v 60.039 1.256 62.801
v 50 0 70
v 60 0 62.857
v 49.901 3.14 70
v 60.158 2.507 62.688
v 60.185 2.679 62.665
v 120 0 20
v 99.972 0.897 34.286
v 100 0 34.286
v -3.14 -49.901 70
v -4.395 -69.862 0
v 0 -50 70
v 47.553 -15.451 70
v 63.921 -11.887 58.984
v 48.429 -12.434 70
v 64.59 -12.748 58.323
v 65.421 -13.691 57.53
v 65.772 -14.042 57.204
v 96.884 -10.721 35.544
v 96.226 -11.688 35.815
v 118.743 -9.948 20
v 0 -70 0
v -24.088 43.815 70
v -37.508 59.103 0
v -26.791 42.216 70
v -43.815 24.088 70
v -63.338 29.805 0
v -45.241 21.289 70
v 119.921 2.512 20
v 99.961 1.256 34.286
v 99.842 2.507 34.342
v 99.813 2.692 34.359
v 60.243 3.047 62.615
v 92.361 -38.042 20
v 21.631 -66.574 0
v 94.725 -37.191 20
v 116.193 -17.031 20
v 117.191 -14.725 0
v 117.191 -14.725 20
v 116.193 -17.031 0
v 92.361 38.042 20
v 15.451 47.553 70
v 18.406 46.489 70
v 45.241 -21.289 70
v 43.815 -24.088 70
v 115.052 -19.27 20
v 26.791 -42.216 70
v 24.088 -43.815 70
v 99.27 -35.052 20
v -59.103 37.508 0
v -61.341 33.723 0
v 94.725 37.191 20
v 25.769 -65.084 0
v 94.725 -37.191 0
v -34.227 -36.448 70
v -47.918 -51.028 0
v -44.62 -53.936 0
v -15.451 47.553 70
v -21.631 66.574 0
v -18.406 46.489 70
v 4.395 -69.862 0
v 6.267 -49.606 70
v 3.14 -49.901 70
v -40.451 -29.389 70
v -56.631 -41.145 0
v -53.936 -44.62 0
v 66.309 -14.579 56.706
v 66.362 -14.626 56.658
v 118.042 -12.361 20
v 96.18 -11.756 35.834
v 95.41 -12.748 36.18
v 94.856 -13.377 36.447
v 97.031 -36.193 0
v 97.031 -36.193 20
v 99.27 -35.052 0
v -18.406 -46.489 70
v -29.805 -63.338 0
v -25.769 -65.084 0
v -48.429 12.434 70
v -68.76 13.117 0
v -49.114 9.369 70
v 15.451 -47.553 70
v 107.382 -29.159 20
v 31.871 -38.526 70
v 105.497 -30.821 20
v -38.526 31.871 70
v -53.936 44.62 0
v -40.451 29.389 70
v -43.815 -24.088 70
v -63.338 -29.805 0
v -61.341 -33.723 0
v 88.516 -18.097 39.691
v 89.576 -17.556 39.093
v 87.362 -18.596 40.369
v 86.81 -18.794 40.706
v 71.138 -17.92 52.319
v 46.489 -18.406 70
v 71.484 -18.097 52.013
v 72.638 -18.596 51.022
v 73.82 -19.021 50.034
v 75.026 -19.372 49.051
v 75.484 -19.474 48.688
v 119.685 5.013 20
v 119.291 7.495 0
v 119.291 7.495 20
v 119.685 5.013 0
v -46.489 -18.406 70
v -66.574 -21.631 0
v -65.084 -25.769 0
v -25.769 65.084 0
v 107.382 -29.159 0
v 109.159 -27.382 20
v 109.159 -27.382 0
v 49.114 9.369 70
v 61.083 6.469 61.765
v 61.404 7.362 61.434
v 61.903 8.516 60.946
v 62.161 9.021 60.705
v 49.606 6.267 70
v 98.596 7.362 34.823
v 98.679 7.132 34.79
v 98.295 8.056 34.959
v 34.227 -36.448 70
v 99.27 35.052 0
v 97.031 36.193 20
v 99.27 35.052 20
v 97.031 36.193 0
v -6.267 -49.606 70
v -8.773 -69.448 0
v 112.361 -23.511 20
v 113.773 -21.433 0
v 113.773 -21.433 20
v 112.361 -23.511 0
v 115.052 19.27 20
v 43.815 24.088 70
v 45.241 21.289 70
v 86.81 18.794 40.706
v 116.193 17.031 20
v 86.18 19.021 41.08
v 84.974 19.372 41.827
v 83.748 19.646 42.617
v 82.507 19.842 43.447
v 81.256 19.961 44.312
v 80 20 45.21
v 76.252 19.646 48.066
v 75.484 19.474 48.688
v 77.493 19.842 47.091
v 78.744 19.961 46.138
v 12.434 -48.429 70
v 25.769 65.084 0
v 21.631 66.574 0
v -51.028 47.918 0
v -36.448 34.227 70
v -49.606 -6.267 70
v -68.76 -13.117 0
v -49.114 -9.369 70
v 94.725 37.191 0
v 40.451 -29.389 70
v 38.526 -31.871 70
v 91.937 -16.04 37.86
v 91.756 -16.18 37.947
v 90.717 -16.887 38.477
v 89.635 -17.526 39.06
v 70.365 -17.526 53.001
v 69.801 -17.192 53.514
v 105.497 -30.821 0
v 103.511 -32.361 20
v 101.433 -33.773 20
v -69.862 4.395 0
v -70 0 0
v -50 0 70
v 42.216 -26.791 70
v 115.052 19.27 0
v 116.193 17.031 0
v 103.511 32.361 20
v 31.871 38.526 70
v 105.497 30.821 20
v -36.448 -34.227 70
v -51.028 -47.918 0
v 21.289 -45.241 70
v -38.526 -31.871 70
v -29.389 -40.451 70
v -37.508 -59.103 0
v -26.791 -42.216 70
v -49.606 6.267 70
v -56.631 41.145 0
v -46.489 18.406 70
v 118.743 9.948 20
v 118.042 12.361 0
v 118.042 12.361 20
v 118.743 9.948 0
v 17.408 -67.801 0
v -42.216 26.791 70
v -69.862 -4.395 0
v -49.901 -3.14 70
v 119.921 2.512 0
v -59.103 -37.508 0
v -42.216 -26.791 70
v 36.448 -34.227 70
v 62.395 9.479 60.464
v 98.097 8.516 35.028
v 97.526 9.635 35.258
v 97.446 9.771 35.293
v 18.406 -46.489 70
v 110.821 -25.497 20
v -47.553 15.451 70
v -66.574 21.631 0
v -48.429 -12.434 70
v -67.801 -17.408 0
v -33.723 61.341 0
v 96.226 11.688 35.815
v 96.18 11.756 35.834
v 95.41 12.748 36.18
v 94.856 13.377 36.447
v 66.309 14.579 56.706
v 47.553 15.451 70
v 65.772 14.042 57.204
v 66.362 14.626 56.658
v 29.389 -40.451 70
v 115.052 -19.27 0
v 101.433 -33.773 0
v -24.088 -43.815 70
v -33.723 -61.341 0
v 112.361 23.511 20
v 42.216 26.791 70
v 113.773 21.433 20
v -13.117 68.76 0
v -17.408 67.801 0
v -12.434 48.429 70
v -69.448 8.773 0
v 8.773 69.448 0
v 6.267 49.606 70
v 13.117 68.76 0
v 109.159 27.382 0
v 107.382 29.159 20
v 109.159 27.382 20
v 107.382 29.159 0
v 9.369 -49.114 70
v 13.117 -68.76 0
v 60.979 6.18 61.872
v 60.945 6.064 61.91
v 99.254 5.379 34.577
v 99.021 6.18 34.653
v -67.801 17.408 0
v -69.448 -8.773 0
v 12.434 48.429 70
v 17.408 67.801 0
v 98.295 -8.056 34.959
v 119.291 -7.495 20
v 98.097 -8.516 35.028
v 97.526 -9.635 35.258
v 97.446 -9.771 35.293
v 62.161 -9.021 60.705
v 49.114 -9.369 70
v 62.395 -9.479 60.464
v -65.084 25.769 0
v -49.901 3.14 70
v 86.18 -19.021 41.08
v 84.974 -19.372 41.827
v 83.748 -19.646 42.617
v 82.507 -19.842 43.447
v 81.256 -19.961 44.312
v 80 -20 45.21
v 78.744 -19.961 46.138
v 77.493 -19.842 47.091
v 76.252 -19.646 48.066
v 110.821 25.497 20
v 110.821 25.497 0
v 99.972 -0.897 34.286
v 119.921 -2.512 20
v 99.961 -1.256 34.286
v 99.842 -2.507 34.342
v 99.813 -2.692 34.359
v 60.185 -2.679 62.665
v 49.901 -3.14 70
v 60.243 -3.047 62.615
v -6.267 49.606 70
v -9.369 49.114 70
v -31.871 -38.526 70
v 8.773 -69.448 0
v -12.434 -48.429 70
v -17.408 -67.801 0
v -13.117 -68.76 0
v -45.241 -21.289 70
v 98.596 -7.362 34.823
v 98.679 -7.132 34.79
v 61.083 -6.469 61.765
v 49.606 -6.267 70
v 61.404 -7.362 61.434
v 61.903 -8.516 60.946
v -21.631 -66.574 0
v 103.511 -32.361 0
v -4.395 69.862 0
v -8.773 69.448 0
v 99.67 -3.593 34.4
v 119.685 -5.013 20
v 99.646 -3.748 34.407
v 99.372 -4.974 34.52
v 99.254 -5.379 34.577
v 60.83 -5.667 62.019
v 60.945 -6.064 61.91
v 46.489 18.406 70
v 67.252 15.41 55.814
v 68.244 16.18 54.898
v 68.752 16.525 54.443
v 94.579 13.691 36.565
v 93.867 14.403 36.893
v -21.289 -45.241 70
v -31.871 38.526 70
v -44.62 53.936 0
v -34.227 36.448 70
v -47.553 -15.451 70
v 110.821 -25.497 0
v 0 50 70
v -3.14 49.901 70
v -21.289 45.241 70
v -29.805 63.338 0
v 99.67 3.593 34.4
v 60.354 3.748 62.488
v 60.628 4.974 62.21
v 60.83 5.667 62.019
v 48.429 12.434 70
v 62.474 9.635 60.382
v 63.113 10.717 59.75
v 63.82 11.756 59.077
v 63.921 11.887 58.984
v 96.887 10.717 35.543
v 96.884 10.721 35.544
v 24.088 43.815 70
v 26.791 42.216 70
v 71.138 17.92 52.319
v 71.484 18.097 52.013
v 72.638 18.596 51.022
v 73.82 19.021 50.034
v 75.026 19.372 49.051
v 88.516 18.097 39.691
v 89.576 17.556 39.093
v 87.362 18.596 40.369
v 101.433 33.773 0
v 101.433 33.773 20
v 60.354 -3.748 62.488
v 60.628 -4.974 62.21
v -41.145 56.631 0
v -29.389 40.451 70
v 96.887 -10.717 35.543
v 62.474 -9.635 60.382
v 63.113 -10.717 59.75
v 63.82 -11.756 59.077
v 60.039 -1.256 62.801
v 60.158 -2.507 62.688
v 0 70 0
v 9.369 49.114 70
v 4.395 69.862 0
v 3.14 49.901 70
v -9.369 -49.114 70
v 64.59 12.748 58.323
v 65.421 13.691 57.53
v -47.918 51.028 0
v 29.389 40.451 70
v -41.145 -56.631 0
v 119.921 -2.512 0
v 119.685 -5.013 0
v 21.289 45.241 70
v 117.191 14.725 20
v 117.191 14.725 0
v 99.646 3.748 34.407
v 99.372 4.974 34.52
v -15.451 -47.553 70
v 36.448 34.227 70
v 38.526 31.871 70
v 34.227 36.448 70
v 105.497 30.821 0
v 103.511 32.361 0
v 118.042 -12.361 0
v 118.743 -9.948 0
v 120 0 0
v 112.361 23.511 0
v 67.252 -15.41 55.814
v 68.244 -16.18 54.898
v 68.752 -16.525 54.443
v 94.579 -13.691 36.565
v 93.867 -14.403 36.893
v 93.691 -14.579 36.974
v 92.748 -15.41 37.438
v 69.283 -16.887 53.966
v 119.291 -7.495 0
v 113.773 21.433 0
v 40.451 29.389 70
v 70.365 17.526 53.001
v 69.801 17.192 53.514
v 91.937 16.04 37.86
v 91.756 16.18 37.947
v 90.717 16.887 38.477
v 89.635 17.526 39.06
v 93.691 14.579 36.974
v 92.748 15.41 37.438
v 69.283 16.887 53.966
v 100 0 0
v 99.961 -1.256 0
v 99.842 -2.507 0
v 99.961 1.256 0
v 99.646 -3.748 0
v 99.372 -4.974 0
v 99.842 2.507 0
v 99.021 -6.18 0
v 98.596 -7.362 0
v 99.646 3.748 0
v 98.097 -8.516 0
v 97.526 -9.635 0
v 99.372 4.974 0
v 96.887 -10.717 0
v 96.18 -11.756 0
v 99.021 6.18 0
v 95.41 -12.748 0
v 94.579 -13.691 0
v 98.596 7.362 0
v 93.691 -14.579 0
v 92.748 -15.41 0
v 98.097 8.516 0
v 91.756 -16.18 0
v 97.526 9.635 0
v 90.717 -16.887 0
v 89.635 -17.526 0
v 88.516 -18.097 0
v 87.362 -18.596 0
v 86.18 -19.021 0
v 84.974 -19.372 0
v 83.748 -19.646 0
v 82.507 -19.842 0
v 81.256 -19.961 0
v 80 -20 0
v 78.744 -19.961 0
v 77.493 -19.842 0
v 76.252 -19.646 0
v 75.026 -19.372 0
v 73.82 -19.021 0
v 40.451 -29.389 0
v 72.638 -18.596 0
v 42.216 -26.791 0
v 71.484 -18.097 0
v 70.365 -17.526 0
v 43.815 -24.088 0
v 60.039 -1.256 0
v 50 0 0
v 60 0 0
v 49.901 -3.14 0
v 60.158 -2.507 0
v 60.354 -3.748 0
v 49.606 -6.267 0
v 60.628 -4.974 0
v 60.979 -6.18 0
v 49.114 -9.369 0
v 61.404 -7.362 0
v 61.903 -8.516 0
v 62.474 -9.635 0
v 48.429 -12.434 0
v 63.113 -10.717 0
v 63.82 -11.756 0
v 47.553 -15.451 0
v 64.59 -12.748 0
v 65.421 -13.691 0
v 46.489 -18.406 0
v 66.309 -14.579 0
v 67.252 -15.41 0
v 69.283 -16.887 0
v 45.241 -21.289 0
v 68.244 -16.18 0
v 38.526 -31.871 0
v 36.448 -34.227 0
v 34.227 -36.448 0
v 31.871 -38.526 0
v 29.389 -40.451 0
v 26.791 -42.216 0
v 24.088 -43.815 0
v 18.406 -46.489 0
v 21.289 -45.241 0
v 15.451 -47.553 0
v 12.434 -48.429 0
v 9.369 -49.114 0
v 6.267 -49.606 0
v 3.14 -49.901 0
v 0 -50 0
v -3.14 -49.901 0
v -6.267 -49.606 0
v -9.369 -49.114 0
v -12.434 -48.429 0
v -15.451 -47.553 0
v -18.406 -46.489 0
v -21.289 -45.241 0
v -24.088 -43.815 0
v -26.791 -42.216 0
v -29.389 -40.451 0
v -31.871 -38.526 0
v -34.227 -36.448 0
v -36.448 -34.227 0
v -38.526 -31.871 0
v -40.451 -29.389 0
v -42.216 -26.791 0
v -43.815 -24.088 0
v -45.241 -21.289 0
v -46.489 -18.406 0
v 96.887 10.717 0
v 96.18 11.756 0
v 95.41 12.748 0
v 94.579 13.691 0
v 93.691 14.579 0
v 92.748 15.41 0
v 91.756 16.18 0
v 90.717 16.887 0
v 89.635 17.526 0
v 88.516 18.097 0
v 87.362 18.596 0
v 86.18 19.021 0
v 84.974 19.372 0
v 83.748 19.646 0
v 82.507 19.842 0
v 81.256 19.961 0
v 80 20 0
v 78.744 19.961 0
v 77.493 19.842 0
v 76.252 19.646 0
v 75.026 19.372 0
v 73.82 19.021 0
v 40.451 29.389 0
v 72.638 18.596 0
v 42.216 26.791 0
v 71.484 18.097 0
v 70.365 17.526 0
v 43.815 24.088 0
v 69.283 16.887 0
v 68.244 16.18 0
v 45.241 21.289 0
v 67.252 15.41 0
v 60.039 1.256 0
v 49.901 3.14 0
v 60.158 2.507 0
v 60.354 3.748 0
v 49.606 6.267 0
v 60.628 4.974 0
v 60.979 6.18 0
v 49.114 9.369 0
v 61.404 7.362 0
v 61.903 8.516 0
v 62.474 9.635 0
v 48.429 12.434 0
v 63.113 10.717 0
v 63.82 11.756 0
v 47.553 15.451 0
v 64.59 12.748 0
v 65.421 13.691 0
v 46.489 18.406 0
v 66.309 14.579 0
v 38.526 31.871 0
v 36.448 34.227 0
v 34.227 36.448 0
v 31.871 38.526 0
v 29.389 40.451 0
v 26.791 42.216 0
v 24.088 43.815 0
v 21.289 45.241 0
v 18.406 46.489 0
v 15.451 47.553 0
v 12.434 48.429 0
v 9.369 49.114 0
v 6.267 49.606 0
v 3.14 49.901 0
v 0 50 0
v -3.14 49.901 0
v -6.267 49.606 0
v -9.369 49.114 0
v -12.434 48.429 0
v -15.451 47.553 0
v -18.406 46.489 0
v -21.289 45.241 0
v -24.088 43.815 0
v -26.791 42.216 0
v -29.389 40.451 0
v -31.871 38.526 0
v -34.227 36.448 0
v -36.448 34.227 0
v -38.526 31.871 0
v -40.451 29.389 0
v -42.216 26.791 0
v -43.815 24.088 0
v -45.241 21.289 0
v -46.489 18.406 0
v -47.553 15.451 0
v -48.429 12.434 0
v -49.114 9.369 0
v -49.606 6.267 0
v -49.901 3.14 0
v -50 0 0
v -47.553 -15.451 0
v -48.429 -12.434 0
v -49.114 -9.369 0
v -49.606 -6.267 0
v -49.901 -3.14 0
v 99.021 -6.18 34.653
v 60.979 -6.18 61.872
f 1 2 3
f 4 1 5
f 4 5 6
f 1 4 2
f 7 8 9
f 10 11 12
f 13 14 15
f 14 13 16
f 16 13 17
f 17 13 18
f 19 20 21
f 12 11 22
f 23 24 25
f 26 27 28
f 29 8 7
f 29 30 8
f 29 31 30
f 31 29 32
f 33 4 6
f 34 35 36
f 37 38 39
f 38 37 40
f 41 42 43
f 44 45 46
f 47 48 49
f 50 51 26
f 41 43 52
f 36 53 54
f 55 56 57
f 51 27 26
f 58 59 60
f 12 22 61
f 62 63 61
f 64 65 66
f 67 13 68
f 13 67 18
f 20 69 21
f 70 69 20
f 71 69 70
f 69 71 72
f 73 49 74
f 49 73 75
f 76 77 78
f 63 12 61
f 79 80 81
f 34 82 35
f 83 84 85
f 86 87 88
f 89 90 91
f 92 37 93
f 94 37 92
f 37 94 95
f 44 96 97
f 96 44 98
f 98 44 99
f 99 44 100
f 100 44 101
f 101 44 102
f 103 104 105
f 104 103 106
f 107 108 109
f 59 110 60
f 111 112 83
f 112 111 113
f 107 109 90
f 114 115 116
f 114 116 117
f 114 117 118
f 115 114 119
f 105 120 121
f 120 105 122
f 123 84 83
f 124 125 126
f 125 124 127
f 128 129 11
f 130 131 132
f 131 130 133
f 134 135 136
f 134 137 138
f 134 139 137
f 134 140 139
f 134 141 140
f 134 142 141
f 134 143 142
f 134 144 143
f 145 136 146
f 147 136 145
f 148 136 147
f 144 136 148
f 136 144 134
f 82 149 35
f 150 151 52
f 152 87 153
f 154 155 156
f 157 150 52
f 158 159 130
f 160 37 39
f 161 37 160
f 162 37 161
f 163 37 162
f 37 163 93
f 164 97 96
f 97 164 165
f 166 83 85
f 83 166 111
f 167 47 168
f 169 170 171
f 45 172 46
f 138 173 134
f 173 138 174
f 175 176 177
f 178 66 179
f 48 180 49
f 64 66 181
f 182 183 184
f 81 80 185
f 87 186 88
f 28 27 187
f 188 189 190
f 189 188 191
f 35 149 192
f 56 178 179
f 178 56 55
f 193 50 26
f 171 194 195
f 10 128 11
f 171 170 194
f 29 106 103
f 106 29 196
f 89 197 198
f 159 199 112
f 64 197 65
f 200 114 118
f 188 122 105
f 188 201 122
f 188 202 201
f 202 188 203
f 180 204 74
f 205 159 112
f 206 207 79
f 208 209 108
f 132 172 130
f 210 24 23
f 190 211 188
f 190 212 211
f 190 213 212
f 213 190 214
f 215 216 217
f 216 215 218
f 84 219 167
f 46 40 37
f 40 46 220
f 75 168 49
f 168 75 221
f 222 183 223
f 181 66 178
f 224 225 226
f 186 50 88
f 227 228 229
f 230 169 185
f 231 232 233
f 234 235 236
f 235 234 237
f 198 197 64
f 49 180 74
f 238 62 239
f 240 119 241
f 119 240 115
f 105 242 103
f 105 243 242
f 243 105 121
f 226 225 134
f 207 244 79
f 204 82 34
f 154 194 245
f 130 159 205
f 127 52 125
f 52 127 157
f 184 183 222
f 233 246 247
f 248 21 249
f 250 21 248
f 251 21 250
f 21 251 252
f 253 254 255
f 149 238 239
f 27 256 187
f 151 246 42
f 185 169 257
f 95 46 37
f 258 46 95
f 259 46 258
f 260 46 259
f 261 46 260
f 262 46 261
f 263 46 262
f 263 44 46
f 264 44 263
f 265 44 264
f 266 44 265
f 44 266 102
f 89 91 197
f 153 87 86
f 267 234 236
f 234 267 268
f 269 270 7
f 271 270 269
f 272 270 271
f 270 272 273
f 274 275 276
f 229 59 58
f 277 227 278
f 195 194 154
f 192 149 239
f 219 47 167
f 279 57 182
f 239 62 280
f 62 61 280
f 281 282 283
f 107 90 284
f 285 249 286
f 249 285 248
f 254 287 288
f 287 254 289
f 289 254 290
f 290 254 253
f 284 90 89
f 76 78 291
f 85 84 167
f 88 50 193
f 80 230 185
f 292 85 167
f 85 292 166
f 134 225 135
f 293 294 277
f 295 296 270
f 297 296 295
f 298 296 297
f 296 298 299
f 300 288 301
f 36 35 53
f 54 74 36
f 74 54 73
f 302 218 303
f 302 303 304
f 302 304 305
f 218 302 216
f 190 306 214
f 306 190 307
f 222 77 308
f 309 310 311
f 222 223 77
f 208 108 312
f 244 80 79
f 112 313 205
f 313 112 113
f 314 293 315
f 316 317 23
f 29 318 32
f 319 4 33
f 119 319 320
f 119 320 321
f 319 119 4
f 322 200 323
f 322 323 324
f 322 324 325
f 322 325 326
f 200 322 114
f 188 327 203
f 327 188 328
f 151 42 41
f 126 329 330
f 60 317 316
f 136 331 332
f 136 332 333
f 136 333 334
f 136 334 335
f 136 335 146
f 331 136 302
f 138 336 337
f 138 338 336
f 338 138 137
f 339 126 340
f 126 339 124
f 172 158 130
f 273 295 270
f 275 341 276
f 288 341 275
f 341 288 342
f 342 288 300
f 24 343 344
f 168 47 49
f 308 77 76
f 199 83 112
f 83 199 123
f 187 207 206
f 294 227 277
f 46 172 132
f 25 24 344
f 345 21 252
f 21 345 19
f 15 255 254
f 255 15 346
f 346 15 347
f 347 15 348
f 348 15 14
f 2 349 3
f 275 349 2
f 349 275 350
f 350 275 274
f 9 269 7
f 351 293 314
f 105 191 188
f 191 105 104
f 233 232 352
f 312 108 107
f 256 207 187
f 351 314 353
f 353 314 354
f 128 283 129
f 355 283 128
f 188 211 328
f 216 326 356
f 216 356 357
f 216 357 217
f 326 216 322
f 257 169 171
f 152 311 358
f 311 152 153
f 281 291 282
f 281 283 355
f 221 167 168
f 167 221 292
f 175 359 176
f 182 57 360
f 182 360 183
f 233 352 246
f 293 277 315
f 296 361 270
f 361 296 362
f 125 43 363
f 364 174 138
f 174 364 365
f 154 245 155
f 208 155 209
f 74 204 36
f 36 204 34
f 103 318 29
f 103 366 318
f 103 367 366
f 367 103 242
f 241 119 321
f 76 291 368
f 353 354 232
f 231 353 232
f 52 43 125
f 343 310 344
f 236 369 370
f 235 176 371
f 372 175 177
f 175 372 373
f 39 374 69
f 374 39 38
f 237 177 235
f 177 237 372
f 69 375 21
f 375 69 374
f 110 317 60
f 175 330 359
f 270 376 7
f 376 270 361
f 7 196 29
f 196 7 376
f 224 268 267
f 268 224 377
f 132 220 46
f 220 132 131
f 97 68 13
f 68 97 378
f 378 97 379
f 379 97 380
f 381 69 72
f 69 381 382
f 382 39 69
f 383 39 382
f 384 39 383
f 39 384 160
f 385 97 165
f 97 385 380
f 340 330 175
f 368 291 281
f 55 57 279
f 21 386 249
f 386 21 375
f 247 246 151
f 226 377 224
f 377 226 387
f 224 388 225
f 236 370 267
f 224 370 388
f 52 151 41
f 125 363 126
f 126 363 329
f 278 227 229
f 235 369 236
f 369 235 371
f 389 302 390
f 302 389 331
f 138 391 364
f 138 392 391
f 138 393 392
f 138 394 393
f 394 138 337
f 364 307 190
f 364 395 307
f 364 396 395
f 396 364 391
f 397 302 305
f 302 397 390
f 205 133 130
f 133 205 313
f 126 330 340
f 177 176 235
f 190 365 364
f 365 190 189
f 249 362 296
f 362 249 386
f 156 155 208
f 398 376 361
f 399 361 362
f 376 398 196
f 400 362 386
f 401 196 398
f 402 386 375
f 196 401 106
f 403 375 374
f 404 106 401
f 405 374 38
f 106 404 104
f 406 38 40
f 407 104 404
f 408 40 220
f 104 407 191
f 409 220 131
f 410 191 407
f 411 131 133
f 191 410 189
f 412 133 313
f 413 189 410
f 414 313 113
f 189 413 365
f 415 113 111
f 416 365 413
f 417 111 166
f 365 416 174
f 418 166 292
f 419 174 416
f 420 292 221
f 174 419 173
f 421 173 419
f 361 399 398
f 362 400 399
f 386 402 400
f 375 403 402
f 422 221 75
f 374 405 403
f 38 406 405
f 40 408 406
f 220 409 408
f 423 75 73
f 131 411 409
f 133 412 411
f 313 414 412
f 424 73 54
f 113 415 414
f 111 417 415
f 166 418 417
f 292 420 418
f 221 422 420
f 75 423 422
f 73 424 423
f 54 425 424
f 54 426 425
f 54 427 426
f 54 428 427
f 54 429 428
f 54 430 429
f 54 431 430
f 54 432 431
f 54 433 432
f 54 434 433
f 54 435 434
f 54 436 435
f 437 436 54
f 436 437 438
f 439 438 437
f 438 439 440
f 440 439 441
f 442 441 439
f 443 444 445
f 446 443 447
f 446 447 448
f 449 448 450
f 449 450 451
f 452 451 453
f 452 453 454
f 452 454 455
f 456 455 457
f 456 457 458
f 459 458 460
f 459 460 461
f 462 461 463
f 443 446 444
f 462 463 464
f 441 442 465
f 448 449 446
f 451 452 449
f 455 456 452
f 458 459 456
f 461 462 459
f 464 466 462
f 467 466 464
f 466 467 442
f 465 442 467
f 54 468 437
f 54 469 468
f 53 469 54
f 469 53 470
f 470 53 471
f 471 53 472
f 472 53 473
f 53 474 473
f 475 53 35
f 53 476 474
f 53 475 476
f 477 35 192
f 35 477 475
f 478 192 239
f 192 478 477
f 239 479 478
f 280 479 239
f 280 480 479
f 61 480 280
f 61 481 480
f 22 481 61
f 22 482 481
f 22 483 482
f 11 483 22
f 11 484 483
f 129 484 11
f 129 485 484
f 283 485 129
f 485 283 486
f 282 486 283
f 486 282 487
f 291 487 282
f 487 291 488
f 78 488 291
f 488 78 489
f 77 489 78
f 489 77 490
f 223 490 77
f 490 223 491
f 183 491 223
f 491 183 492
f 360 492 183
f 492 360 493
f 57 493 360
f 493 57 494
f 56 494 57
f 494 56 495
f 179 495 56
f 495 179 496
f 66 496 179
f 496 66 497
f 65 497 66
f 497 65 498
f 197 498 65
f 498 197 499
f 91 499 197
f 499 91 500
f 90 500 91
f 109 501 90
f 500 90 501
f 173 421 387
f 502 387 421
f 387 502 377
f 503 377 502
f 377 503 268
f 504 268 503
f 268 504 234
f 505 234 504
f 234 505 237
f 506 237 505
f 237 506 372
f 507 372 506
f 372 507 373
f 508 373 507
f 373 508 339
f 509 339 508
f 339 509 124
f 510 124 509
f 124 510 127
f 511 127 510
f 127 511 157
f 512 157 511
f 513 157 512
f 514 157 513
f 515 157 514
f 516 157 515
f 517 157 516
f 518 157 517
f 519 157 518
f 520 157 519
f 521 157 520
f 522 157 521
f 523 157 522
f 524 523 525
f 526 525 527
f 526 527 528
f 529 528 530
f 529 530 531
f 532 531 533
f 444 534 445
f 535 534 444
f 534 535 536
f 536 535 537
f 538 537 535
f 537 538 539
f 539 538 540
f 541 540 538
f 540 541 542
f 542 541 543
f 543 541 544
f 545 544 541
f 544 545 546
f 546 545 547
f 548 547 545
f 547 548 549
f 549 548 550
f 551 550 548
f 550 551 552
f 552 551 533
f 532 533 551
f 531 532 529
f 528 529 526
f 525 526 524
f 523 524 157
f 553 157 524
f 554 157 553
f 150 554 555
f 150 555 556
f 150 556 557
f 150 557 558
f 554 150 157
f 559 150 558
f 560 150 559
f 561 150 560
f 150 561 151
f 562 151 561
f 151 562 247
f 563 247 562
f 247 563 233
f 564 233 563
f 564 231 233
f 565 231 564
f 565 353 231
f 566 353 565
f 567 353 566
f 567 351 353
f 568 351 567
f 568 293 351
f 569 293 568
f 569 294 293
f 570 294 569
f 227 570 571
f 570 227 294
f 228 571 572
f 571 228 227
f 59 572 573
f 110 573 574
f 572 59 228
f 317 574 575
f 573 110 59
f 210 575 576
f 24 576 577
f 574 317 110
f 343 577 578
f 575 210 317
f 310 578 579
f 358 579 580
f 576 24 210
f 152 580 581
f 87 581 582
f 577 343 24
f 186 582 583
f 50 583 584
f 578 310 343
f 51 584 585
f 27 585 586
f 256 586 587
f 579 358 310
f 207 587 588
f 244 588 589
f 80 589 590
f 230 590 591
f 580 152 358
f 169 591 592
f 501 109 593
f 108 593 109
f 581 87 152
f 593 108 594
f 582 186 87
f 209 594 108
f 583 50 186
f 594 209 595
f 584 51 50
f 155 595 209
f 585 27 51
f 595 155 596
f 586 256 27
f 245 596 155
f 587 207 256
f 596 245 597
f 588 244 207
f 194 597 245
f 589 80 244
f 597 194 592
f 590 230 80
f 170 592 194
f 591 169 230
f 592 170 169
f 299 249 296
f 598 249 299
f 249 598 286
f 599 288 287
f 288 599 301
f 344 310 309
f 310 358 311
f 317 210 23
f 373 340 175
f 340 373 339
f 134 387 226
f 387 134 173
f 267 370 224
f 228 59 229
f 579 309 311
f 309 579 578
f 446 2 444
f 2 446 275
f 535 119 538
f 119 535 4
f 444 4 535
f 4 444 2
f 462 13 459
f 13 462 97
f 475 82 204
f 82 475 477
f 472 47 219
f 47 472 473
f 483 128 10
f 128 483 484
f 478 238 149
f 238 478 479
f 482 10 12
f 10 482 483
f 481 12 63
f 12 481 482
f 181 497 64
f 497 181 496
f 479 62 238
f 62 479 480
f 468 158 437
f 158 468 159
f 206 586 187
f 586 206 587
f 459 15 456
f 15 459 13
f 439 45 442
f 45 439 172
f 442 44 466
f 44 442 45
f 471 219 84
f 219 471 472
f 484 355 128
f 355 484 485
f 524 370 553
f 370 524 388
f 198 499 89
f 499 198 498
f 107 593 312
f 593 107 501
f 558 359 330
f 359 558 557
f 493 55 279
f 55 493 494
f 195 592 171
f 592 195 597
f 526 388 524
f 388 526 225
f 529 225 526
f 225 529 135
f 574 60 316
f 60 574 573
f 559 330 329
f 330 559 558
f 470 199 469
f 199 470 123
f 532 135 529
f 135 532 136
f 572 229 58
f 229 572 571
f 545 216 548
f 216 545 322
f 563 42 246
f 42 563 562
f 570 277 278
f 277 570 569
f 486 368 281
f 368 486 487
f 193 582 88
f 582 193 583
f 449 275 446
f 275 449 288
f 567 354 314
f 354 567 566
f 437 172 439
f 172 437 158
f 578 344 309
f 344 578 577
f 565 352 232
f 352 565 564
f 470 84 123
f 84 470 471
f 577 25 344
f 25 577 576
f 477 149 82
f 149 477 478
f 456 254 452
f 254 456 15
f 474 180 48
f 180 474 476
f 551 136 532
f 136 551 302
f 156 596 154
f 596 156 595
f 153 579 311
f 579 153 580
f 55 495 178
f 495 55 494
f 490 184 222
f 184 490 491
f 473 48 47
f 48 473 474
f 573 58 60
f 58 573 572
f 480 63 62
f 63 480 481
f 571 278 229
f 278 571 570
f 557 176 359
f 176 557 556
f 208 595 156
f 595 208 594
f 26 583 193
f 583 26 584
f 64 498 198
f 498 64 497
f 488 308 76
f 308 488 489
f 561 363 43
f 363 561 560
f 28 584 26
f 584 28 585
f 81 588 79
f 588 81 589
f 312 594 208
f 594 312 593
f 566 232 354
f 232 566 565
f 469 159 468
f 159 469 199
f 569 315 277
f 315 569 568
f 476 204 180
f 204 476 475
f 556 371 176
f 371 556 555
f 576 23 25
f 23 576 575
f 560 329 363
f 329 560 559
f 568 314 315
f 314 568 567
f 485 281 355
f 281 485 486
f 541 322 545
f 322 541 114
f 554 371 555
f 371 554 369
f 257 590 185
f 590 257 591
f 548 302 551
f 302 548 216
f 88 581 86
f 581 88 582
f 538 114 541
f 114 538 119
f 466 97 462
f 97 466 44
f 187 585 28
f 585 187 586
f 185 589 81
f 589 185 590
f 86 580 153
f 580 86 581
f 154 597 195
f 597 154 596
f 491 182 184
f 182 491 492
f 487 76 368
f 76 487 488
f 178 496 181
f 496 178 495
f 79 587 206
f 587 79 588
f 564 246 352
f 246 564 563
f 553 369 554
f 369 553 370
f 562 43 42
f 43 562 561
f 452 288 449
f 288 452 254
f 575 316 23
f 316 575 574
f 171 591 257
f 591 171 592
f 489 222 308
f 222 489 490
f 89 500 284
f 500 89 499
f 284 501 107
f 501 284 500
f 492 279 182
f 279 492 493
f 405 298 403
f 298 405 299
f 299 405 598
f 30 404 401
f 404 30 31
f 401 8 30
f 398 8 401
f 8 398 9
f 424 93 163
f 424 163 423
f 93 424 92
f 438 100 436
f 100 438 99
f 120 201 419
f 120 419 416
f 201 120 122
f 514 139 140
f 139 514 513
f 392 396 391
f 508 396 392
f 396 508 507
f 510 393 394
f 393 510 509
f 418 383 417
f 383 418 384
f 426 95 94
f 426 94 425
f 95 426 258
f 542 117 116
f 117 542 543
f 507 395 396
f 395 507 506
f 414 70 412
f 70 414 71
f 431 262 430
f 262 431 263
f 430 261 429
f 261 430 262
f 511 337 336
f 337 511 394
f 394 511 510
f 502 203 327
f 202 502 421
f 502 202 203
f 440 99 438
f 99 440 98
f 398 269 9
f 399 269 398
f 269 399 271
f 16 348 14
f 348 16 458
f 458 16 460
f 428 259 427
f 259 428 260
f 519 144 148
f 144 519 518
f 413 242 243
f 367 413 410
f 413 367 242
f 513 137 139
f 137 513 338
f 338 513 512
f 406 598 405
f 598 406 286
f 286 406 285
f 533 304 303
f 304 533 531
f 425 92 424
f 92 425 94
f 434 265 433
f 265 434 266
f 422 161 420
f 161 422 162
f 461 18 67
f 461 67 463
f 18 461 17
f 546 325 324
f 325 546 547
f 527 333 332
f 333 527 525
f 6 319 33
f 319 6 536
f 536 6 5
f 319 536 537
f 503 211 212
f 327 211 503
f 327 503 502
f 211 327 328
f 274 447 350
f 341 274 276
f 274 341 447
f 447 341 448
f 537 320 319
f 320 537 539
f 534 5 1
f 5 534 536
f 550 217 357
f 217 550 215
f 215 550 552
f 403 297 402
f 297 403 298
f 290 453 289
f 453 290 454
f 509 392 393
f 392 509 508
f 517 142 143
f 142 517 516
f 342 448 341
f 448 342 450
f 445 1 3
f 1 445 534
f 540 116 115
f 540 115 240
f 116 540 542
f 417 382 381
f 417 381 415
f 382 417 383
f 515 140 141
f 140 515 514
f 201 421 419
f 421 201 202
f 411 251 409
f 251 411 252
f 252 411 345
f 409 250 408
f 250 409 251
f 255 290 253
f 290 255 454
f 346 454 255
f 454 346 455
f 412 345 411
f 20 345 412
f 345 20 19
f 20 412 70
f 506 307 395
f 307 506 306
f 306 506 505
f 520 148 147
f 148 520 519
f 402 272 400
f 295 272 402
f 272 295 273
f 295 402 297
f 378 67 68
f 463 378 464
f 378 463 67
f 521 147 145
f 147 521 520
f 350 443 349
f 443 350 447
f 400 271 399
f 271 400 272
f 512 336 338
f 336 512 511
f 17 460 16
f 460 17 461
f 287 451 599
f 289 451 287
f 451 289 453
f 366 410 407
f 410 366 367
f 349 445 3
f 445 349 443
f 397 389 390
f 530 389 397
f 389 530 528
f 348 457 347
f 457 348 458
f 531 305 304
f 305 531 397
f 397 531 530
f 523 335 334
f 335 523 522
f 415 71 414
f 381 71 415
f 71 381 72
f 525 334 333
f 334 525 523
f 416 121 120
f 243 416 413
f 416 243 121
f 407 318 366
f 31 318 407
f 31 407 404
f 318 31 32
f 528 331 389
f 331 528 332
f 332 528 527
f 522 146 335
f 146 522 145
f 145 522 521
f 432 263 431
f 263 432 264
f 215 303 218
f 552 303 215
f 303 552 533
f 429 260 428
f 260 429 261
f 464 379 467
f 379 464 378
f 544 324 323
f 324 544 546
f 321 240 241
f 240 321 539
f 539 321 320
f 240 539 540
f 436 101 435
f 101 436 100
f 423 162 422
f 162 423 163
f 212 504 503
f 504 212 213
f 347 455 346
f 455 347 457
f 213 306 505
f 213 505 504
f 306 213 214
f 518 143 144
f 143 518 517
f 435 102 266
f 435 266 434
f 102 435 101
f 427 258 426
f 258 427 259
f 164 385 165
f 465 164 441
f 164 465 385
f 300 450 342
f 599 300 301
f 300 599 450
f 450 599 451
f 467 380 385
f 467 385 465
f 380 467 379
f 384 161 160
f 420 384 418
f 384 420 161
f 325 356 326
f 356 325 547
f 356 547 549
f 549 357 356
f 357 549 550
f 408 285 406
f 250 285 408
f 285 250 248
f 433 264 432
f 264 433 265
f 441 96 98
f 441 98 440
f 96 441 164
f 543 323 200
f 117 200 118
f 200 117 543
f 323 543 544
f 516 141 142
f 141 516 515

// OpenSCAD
bigRingRadius=50;
bigRingHeight=70;


outerWidth=10;

smallRingRadius=20;
smallRingOffset=bigRingRadius + smallRingRadius + 10;
smallRingHeight=20;



$fn=100;


difference() {
  hull() {
    difference() {
      cylinder(r1=bigRingRadius + outerWidth * 2, r2=bigRingRadius,  h=bigRingHeight, center=false);    
    }
    translate([smallRingOffset, 0, 0]) {
      cylinder(r=smallRingRadius + outerWidth * 2, h=smallRingHeight, center=false);  
    }  
  }

  cylinder(r=bigRingRadius, h=bigRingHeight, center=false);
  translate([smallRingOffset, 0, 0]) {
      cylinder(r=smallRingRadius, h=bigRingHeight, center=false);  
    }  
}
